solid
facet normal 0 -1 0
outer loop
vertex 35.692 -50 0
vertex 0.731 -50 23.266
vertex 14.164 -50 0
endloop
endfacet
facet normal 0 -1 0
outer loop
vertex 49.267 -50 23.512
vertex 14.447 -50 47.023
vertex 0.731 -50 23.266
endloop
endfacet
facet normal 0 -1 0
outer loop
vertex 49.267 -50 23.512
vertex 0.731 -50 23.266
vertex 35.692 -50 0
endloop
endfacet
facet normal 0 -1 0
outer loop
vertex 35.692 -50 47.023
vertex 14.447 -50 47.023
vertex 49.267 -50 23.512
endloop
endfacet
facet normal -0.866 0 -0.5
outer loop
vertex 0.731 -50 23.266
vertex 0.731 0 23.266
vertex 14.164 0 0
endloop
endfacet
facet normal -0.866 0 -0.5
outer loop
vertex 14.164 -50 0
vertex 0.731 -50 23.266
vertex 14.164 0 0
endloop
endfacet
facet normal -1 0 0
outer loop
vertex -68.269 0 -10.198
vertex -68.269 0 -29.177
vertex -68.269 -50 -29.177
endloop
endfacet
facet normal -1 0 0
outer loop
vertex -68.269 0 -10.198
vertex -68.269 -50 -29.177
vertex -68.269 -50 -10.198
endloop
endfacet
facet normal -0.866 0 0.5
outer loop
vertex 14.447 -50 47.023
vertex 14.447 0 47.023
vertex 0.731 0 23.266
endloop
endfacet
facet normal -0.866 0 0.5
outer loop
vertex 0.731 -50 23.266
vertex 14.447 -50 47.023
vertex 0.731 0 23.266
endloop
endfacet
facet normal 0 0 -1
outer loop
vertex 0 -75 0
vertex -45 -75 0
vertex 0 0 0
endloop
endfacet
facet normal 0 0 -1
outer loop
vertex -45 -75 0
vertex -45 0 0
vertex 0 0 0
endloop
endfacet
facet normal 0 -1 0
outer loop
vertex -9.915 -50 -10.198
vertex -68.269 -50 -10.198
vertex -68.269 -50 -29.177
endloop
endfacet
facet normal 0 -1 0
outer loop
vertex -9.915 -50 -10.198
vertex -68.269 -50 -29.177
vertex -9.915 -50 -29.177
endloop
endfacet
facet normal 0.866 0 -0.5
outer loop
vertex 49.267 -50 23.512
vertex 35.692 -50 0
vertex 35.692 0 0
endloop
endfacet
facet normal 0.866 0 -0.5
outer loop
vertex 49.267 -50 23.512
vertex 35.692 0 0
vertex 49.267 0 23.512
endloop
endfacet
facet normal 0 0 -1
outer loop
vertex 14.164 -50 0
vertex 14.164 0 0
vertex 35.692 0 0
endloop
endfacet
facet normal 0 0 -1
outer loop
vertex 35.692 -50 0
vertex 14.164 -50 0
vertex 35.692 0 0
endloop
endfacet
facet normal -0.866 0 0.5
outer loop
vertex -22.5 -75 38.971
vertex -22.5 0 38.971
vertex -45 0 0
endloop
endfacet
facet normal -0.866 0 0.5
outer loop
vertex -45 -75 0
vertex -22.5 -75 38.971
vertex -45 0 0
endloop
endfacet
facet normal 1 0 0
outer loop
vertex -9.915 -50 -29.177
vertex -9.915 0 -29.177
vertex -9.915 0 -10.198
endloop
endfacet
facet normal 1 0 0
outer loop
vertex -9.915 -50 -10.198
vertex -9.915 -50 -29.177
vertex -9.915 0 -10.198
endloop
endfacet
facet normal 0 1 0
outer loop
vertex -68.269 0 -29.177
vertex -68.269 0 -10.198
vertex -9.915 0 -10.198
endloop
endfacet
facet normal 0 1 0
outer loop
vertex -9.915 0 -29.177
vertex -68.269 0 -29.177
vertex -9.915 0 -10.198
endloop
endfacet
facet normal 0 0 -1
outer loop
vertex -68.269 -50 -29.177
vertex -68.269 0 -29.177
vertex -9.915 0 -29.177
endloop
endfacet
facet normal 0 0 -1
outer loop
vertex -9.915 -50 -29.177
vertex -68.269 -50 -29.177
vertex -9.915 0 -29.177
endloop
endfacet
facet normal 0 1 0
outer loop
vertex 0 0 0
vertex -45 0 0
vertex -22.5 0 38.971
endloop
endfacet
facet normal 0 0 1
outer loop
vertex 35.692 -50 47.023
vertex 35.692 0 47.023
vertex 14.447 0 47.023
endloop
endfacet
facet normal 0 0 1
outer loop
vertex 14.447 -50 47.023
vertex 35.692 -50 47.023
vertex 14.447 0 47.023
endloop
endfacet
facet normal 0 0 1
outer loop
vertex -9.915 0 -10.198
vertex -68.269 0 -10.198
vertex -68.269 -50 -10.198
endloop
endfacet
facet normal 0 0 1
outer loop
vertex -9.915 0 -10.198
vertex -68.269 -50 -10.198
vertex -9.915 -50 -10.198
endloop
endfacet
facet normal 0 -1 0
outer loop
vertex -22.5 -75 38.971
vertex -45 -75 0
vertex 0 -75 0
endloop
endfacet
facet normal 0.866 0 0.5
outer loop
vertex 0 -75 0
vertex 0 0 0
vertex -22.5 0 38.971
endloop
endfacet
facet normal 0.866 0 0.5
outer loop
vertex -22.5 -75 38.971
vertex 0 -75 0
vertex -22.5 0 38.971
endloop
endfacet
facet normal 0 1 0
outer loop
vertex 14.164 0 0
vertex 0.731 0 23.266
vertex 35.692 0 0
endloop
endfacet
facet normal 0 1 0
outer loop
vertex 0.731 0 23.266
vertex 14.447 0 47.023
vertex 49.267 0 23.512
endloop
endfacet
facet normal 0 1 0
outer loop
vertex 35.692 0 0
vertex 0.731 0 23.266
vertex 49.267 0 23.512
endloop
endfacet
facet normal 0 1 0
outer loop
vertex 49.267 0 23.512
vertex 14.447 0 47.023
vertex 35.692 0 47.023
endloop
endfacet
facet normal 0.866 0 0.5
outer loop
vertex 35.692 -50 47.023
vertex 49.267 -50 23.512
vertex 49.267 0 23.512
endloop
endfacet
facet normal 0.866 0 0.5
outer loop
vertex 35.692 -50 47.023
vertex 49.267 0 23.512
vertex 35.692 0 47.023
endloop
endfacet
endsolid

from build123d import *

# Parameters (mm, degrees)
F1_DEPTH = 25
F3_DEPTH = 50
F4_DEPTH = 50
F5_W     = 58.354319
F5_H     = 18.979319
F6_DEPTH = 50


with BuildPart() as f1:
    # F0 (on Front) → F1 (new body)
    with BuildSketch(Plane.XZ):
        Polygon((-45, 0), (0, 0), (-22.5, 38.971143), align=None)
    extrude(amount=F1_DEPTH)

    # F1_face (on face) → F4 (join)
    with BuildSketch(Plane(origin=(-22.5, -25, 12.990381), x_dir=(1, 0, 0), z_dir=(0, -1, 0))):
        Polygon((0, 25.980762), (-22.5, -12.990381), (22.5, -12.990381), align=None)
    extrude(amount=F4_DEPTH)


with BuildPart() as f3:
    # F2 (on Front) → F3 (new body)
    with BuildSketch(Plane.XZ):
        Polygon((0.730825, 23.266371), (14.163671, 0), (35.69245, 0), (49.266932, 23.511693), (35.69245, 47.023386), (14.446944, 47.023386), align=None)
    extrude(amount=F3_DEPTH)


with BuildPart() as f6:
    # F5 (on Front) → F6 (new body)
    with BuildSketch(Plane.XZ):
        with Locations((-39.091729, -19.687501)):
            Rectangle(F5_W, F5_H)
    extrude(amount=F6_DEPTH)


solid = Compound([f1.part, f3.part, f6.part])
